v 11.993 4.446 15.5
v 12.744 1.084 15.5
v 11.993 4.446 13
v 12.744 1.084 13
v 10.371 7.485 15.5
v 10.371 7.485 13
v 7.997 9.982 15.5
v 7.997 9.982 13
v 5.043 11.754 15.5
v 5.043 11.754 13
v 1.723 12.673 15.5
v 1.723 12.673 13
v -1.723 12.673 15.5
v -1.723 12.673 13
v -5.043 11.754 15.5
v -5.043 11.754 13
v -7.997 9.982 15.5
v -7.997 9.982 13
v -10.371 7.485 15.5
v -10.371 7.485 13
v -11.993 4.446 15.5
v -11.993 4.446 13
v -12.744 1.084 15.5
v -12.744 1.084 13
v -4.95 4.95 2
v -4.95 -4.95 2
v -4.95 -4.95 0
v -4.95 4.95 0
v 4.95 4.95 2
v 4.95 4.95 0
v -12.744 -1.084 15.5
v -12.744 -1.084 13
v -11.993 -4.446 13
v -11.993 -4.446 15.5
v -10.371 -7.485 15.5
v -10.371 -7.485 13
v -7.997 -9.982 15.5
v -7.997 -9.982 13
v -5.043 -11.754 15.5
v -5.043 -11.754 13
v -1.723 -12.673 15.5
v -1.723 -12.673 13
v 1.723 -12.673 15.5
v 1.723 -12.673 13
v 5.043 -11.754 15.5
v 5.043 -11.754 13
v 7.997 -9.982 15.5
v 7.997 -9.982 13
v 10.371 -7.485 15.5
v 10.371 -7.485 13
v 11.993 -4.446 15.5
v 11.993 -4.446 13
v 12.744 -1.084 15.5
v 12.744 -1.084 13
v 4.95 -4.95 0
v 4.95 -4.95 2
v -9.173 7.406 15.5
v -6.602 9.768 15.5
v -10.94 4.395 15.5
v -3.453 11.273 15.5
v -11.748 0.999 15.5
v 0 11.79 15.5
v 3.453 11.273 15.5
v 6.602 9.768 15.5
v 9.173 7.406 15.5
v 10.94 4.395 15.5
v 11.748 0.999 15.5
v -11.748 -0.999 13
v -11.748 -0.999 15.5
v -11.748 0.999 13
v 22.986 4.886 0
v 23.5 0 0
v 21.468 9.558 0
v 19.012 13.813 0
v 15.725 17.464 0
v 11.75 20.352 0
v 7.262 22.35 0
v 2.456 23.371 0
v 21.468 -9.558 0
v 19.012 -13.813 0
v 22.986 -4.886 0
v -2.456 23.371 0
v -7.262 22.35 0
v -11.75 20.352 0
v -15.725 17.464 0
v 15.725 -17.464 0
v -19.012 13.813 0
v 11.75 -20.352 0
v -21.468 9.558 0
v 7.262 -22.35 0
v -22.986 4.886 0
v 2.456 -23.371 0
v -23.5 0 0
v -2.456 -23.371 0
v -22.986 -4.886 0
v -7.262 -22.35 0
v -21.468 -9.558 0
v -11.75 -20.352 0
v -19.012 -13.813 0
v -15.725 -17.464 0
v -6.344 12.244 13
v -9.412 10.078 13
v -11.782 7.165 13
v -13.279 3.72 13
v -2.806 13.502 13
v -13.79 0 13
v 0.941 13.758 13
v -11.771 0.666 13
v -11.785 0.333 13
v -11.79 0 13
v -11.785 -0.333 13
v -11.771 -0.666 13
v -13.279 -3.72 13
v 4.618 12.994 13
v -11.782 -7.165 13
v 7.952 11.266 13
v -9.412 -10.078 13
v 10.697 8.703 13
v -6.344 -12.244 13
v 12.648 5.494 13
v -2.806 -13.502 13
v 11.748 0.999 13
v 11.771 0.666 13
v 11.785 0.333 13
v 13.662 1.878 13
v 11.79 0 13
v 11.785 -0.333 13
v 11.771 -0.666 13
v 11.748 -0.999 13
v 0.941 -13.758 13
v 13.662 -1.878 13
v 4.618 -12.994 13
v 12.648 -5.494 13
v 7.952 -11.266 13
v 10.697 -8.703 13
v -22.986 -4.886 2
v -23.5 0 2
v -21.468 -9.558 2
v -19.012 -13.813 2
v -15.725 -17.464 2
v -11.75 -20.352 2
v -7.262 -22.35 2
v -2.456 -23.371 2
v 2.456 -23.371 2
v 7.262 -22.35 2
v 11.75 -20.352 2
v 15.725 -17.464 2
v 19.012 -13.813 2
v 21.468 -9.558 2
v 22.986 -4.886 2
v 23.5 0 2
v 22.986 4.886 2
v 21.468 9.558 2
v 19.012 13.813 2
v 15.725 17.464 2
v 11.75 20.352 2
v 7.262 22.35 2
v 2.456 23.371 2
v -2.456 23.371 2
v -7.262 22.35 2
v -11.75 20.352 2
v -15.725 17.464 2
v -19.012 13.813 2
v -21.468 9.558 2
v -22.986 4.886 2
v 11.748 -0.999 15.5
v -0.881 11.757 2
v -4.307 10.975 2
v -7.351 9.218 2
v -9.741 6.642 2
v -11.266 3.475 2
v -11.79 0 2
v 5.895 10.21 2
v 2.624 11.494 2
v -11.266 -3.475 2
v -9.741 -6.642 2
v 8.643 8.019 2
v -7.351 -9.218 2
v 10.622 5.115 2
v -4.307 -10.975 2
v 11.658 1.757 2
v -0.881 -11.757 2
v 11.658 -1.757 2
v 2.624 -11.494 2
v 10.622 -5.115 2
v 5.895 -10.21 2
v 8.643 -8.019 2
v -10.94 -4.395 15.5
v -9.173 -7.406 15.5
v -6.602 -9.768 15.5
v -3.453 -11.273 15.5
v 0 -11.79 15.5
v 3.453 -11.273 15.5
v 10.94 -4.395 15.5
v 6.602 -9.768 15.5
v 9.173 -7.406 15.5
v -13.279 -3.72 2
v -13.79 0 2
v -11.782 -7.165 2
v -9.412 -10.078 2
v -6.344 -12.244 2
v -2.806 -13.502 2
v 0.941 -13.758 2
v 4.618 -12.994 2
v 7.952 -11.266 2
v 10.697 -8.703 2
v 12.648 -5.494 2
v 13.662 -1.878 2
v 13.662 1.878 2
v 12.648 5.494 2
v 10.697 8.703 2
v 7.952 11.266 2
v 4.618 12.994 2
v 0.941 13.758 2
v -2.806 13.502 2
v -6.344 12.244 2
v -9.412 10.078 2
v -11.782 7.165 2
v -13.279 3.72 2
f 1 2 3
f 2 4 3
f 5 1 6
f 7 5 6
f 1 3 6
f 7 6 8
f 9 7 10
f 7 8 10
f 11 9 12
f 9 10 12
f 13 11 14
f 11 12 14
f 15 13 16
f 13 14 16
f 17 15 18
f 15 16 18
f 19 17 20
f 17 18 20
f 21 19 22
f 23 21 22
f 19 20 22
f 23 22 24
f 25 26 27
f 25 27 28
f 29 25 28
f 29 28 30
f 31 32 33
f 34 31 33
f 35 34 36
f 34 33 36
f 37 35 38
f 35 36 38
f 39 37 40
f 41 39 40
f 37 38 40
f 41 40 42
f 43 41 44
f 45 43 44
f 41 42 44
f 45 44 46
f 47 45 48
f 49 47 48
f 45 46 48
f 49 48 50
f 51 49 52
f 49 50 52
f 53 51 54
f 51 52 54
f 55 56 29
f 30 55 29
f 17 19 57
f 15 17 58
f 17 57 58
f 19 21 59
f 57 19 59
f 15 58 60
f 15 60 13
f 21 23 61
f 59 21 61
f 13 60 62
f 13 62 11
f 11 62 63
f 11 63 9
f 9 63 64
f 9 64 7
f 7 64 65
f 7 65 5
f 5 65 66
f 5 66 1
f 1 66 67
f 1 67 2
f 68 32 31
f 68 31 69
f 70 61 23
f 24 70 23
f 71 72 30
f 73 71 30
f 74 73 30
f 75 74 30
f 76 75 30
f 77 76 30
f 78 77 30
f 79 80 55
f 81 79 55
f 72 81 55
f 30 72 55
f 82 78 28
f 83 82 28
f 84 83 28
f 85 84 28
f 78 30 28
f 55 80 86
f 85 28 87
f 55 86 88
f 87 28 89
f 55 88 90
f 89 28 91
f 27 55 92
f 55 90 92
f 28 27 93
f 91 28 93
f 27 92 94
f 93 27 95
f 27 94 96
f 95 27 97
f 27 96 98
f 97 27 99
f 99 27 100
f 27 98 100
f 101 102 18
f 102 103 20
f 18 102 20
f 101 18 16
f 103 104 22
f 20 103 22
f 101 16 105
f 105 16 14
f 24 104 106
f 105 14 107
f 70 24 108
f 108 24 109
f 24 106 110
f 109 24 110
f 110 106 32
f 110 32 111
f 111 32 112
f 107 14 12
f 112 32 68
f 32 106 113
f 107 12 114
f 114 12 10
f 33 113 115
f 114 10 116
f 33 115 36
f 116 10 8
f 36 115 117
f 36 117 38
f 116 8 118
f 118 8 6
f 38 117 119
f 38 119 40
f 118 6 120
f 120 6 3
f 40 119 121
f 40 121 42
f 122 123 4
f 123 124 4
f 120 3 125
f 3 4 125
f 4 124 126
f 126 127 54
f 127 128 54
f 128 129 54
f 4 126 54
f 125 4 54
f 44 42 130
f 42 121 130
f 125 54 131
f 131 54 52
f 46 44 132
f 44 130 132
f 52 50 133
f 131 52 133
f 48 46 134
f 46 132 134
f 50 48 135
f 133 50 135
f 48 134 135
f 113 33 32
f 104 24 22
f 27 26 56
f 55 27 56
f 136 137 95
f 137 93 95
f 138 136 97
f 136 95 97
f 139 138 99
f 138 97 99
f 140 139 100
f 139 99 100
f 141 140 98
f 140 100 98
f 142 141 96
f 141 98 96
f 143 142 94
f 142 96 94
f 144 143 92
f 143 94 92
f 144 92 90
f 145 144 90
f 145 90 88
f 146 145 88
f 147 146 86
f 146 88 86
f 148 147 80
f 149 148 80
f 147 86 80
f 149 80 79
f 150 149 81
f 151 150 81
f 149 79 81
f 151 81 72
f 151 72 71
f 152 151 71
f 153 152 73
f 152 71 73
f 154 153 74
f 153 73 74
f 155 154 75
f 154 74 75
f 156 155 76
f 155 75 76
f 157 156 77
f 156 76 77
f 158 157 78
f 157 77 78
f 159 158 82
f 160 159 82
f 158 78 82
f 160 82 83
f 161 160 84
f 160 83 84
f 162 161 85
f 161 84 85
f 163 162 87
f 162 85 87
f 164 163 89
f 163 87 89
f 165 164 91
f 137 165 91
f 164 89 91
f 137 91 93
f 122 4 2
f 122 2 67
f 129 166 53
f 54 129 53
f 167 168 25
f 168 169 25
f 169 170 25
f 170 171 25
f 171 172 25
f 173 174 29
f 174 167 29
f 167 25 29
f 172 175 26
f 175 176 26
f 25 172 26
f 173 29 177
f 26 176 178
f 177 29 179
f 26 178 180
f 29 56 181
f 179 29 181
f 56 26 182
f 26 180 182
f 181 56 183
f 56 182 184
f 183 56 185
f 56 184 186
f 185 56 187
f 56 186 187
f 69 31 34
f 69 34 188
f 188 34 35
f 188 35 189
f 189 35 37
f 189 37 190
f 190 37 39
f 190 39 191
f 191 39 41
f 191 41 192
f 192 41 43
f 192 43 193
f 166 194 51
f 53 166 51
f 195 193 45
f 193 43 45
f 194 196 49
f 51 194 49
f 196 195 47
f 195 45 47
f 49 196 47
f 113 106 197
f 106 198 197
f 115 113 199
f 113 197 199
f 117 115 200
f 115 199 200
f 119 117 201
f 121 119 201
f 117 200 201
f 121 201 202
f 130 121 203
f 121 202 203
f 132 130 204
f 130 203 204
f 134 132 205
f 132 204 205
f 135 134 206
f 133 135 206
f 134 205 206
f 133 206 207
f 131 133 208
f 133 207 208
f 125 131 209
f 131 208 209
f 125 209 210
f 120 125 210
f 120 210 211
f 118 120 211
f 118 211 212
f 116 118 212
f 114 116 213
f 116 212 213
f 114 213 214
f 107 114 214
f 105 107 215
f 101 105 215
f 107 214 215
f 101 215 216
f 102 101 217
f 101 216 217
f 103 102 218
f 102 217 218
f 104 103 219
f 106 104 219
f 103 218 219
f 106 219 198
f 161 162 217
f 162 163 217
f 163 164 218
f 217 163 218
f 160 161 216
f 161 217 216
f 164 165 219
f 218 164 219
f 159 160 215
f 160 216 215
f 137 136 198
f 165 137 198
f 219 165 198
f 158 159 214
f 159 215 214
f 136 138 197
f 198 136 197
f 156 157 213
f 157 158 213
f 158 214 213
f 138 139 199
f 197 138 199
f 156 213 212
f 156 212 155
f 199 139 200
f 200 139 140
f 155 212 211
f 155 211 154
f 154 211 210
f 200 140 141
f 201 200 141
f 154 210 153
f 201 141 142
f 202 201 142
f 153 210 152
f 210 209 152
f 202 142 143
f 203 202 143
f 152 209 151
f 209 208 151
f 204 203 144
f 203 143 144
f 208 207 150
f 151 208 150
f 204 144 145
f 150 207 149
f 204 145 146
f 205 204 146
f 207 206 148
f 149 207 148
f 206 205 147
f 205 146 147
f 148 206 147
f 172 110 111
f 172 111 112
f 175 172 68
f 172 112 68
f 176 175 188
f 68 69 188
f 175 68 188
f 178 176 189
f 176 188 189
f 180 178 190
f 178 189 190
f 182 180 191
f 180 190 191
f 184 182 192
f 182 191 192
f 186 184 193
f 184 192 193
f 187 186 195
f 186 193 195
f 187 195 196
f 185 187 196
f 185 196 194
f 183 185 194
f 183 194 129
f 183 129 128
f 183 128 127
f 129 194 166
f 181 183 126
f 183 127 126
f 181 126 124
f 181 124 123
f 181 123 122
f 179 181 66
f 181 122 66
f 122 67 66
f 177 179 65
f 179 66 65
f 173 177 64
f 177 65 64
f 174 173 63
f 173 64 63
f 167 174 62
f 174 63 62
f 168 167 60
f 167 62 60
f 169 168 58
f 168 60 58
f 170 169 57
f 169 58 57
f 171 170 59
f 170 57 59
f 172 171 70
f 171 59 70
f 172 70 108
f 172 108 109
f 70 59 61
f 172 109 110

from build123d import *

# Parameters (mm, degrees)
F3_DEPTH = 2.5
F4_W     = 9.8994949366
F4_H     = 9.8994949366
F5_DEPTH = 2.001


with BuildPart() as f1:
    # F0 (on Front) → F1 (revolve)
    with BuildSketch(Plane.XZ):
        Polygon((-23.5, 0), (0, 0), (0, 2), (-11.79, 2), (-11.79, 13), (-11.79, 15.5), (-12.79, 15.5), (-12.79, 13), (-13.79, 13), (-13.79, 2), (-23.5, 2), align=None)
    revolve(axis=Axis((0, 0, 1), (0, 0, 1)))

    # F2 (on face) → F3 (cut, through all)
    with BuildSketch(Plane.XY.offset(15.5)):
        with BuildLine():
            Line((-11.7476165971, 0.9988014258), (-12.7440217368, 1.0835174076))
            ThreePointArc((-12.7440217368, 1.0835174076), (-12.79, 0), (-12.7440217368, -1.0835174076))
            Line((-12.7440217368, -1.0835174076), (-11.7476165971, -0.9988014258))
            ThreePointArc((-11.7476165971, -0.9988014258), (-11.79, 0), (-11.7476165971, 0.9988014258))
        make_face()
        with BuildLine():
            ThreePointArc((12.7440217368, -1.0835174076), (12.7785002644, -0.5422462479), (12.79, 0))
            ThreePointArc((12.79, 0), (12.7785002644, 0.5422462479), (12.7440217368, 1.0835174076))
            Line((12.7440217368, 1.0835174076), (11.7476165971, 0.9988014258))
            ThreePointArc((11.7476165971, 0.9988014258), (11.7793993837, 0.4998501378), (11.79, 0))
            ThreePointArc((11.79, 0), (11.7793993837, -0.4998501378), (11.7476165971, -0.9988014258))
            Line((11.7476165971, -0.9988014258), (12.7440217368, -1.0835174076))
        make_face()
    extrude(amount=-F3_DEPTH, mode=Mode.SUBTRACT)

    # F4 (on face) → F5 (cut, through all)
    with BuildSketch(Plane.XY.offset(2)):
        Rectangle(F4_W, F4_H)
    extrude(amount=-F5_DEPTH, mode=Mode.SUBTRACT)


solid = f1.part
